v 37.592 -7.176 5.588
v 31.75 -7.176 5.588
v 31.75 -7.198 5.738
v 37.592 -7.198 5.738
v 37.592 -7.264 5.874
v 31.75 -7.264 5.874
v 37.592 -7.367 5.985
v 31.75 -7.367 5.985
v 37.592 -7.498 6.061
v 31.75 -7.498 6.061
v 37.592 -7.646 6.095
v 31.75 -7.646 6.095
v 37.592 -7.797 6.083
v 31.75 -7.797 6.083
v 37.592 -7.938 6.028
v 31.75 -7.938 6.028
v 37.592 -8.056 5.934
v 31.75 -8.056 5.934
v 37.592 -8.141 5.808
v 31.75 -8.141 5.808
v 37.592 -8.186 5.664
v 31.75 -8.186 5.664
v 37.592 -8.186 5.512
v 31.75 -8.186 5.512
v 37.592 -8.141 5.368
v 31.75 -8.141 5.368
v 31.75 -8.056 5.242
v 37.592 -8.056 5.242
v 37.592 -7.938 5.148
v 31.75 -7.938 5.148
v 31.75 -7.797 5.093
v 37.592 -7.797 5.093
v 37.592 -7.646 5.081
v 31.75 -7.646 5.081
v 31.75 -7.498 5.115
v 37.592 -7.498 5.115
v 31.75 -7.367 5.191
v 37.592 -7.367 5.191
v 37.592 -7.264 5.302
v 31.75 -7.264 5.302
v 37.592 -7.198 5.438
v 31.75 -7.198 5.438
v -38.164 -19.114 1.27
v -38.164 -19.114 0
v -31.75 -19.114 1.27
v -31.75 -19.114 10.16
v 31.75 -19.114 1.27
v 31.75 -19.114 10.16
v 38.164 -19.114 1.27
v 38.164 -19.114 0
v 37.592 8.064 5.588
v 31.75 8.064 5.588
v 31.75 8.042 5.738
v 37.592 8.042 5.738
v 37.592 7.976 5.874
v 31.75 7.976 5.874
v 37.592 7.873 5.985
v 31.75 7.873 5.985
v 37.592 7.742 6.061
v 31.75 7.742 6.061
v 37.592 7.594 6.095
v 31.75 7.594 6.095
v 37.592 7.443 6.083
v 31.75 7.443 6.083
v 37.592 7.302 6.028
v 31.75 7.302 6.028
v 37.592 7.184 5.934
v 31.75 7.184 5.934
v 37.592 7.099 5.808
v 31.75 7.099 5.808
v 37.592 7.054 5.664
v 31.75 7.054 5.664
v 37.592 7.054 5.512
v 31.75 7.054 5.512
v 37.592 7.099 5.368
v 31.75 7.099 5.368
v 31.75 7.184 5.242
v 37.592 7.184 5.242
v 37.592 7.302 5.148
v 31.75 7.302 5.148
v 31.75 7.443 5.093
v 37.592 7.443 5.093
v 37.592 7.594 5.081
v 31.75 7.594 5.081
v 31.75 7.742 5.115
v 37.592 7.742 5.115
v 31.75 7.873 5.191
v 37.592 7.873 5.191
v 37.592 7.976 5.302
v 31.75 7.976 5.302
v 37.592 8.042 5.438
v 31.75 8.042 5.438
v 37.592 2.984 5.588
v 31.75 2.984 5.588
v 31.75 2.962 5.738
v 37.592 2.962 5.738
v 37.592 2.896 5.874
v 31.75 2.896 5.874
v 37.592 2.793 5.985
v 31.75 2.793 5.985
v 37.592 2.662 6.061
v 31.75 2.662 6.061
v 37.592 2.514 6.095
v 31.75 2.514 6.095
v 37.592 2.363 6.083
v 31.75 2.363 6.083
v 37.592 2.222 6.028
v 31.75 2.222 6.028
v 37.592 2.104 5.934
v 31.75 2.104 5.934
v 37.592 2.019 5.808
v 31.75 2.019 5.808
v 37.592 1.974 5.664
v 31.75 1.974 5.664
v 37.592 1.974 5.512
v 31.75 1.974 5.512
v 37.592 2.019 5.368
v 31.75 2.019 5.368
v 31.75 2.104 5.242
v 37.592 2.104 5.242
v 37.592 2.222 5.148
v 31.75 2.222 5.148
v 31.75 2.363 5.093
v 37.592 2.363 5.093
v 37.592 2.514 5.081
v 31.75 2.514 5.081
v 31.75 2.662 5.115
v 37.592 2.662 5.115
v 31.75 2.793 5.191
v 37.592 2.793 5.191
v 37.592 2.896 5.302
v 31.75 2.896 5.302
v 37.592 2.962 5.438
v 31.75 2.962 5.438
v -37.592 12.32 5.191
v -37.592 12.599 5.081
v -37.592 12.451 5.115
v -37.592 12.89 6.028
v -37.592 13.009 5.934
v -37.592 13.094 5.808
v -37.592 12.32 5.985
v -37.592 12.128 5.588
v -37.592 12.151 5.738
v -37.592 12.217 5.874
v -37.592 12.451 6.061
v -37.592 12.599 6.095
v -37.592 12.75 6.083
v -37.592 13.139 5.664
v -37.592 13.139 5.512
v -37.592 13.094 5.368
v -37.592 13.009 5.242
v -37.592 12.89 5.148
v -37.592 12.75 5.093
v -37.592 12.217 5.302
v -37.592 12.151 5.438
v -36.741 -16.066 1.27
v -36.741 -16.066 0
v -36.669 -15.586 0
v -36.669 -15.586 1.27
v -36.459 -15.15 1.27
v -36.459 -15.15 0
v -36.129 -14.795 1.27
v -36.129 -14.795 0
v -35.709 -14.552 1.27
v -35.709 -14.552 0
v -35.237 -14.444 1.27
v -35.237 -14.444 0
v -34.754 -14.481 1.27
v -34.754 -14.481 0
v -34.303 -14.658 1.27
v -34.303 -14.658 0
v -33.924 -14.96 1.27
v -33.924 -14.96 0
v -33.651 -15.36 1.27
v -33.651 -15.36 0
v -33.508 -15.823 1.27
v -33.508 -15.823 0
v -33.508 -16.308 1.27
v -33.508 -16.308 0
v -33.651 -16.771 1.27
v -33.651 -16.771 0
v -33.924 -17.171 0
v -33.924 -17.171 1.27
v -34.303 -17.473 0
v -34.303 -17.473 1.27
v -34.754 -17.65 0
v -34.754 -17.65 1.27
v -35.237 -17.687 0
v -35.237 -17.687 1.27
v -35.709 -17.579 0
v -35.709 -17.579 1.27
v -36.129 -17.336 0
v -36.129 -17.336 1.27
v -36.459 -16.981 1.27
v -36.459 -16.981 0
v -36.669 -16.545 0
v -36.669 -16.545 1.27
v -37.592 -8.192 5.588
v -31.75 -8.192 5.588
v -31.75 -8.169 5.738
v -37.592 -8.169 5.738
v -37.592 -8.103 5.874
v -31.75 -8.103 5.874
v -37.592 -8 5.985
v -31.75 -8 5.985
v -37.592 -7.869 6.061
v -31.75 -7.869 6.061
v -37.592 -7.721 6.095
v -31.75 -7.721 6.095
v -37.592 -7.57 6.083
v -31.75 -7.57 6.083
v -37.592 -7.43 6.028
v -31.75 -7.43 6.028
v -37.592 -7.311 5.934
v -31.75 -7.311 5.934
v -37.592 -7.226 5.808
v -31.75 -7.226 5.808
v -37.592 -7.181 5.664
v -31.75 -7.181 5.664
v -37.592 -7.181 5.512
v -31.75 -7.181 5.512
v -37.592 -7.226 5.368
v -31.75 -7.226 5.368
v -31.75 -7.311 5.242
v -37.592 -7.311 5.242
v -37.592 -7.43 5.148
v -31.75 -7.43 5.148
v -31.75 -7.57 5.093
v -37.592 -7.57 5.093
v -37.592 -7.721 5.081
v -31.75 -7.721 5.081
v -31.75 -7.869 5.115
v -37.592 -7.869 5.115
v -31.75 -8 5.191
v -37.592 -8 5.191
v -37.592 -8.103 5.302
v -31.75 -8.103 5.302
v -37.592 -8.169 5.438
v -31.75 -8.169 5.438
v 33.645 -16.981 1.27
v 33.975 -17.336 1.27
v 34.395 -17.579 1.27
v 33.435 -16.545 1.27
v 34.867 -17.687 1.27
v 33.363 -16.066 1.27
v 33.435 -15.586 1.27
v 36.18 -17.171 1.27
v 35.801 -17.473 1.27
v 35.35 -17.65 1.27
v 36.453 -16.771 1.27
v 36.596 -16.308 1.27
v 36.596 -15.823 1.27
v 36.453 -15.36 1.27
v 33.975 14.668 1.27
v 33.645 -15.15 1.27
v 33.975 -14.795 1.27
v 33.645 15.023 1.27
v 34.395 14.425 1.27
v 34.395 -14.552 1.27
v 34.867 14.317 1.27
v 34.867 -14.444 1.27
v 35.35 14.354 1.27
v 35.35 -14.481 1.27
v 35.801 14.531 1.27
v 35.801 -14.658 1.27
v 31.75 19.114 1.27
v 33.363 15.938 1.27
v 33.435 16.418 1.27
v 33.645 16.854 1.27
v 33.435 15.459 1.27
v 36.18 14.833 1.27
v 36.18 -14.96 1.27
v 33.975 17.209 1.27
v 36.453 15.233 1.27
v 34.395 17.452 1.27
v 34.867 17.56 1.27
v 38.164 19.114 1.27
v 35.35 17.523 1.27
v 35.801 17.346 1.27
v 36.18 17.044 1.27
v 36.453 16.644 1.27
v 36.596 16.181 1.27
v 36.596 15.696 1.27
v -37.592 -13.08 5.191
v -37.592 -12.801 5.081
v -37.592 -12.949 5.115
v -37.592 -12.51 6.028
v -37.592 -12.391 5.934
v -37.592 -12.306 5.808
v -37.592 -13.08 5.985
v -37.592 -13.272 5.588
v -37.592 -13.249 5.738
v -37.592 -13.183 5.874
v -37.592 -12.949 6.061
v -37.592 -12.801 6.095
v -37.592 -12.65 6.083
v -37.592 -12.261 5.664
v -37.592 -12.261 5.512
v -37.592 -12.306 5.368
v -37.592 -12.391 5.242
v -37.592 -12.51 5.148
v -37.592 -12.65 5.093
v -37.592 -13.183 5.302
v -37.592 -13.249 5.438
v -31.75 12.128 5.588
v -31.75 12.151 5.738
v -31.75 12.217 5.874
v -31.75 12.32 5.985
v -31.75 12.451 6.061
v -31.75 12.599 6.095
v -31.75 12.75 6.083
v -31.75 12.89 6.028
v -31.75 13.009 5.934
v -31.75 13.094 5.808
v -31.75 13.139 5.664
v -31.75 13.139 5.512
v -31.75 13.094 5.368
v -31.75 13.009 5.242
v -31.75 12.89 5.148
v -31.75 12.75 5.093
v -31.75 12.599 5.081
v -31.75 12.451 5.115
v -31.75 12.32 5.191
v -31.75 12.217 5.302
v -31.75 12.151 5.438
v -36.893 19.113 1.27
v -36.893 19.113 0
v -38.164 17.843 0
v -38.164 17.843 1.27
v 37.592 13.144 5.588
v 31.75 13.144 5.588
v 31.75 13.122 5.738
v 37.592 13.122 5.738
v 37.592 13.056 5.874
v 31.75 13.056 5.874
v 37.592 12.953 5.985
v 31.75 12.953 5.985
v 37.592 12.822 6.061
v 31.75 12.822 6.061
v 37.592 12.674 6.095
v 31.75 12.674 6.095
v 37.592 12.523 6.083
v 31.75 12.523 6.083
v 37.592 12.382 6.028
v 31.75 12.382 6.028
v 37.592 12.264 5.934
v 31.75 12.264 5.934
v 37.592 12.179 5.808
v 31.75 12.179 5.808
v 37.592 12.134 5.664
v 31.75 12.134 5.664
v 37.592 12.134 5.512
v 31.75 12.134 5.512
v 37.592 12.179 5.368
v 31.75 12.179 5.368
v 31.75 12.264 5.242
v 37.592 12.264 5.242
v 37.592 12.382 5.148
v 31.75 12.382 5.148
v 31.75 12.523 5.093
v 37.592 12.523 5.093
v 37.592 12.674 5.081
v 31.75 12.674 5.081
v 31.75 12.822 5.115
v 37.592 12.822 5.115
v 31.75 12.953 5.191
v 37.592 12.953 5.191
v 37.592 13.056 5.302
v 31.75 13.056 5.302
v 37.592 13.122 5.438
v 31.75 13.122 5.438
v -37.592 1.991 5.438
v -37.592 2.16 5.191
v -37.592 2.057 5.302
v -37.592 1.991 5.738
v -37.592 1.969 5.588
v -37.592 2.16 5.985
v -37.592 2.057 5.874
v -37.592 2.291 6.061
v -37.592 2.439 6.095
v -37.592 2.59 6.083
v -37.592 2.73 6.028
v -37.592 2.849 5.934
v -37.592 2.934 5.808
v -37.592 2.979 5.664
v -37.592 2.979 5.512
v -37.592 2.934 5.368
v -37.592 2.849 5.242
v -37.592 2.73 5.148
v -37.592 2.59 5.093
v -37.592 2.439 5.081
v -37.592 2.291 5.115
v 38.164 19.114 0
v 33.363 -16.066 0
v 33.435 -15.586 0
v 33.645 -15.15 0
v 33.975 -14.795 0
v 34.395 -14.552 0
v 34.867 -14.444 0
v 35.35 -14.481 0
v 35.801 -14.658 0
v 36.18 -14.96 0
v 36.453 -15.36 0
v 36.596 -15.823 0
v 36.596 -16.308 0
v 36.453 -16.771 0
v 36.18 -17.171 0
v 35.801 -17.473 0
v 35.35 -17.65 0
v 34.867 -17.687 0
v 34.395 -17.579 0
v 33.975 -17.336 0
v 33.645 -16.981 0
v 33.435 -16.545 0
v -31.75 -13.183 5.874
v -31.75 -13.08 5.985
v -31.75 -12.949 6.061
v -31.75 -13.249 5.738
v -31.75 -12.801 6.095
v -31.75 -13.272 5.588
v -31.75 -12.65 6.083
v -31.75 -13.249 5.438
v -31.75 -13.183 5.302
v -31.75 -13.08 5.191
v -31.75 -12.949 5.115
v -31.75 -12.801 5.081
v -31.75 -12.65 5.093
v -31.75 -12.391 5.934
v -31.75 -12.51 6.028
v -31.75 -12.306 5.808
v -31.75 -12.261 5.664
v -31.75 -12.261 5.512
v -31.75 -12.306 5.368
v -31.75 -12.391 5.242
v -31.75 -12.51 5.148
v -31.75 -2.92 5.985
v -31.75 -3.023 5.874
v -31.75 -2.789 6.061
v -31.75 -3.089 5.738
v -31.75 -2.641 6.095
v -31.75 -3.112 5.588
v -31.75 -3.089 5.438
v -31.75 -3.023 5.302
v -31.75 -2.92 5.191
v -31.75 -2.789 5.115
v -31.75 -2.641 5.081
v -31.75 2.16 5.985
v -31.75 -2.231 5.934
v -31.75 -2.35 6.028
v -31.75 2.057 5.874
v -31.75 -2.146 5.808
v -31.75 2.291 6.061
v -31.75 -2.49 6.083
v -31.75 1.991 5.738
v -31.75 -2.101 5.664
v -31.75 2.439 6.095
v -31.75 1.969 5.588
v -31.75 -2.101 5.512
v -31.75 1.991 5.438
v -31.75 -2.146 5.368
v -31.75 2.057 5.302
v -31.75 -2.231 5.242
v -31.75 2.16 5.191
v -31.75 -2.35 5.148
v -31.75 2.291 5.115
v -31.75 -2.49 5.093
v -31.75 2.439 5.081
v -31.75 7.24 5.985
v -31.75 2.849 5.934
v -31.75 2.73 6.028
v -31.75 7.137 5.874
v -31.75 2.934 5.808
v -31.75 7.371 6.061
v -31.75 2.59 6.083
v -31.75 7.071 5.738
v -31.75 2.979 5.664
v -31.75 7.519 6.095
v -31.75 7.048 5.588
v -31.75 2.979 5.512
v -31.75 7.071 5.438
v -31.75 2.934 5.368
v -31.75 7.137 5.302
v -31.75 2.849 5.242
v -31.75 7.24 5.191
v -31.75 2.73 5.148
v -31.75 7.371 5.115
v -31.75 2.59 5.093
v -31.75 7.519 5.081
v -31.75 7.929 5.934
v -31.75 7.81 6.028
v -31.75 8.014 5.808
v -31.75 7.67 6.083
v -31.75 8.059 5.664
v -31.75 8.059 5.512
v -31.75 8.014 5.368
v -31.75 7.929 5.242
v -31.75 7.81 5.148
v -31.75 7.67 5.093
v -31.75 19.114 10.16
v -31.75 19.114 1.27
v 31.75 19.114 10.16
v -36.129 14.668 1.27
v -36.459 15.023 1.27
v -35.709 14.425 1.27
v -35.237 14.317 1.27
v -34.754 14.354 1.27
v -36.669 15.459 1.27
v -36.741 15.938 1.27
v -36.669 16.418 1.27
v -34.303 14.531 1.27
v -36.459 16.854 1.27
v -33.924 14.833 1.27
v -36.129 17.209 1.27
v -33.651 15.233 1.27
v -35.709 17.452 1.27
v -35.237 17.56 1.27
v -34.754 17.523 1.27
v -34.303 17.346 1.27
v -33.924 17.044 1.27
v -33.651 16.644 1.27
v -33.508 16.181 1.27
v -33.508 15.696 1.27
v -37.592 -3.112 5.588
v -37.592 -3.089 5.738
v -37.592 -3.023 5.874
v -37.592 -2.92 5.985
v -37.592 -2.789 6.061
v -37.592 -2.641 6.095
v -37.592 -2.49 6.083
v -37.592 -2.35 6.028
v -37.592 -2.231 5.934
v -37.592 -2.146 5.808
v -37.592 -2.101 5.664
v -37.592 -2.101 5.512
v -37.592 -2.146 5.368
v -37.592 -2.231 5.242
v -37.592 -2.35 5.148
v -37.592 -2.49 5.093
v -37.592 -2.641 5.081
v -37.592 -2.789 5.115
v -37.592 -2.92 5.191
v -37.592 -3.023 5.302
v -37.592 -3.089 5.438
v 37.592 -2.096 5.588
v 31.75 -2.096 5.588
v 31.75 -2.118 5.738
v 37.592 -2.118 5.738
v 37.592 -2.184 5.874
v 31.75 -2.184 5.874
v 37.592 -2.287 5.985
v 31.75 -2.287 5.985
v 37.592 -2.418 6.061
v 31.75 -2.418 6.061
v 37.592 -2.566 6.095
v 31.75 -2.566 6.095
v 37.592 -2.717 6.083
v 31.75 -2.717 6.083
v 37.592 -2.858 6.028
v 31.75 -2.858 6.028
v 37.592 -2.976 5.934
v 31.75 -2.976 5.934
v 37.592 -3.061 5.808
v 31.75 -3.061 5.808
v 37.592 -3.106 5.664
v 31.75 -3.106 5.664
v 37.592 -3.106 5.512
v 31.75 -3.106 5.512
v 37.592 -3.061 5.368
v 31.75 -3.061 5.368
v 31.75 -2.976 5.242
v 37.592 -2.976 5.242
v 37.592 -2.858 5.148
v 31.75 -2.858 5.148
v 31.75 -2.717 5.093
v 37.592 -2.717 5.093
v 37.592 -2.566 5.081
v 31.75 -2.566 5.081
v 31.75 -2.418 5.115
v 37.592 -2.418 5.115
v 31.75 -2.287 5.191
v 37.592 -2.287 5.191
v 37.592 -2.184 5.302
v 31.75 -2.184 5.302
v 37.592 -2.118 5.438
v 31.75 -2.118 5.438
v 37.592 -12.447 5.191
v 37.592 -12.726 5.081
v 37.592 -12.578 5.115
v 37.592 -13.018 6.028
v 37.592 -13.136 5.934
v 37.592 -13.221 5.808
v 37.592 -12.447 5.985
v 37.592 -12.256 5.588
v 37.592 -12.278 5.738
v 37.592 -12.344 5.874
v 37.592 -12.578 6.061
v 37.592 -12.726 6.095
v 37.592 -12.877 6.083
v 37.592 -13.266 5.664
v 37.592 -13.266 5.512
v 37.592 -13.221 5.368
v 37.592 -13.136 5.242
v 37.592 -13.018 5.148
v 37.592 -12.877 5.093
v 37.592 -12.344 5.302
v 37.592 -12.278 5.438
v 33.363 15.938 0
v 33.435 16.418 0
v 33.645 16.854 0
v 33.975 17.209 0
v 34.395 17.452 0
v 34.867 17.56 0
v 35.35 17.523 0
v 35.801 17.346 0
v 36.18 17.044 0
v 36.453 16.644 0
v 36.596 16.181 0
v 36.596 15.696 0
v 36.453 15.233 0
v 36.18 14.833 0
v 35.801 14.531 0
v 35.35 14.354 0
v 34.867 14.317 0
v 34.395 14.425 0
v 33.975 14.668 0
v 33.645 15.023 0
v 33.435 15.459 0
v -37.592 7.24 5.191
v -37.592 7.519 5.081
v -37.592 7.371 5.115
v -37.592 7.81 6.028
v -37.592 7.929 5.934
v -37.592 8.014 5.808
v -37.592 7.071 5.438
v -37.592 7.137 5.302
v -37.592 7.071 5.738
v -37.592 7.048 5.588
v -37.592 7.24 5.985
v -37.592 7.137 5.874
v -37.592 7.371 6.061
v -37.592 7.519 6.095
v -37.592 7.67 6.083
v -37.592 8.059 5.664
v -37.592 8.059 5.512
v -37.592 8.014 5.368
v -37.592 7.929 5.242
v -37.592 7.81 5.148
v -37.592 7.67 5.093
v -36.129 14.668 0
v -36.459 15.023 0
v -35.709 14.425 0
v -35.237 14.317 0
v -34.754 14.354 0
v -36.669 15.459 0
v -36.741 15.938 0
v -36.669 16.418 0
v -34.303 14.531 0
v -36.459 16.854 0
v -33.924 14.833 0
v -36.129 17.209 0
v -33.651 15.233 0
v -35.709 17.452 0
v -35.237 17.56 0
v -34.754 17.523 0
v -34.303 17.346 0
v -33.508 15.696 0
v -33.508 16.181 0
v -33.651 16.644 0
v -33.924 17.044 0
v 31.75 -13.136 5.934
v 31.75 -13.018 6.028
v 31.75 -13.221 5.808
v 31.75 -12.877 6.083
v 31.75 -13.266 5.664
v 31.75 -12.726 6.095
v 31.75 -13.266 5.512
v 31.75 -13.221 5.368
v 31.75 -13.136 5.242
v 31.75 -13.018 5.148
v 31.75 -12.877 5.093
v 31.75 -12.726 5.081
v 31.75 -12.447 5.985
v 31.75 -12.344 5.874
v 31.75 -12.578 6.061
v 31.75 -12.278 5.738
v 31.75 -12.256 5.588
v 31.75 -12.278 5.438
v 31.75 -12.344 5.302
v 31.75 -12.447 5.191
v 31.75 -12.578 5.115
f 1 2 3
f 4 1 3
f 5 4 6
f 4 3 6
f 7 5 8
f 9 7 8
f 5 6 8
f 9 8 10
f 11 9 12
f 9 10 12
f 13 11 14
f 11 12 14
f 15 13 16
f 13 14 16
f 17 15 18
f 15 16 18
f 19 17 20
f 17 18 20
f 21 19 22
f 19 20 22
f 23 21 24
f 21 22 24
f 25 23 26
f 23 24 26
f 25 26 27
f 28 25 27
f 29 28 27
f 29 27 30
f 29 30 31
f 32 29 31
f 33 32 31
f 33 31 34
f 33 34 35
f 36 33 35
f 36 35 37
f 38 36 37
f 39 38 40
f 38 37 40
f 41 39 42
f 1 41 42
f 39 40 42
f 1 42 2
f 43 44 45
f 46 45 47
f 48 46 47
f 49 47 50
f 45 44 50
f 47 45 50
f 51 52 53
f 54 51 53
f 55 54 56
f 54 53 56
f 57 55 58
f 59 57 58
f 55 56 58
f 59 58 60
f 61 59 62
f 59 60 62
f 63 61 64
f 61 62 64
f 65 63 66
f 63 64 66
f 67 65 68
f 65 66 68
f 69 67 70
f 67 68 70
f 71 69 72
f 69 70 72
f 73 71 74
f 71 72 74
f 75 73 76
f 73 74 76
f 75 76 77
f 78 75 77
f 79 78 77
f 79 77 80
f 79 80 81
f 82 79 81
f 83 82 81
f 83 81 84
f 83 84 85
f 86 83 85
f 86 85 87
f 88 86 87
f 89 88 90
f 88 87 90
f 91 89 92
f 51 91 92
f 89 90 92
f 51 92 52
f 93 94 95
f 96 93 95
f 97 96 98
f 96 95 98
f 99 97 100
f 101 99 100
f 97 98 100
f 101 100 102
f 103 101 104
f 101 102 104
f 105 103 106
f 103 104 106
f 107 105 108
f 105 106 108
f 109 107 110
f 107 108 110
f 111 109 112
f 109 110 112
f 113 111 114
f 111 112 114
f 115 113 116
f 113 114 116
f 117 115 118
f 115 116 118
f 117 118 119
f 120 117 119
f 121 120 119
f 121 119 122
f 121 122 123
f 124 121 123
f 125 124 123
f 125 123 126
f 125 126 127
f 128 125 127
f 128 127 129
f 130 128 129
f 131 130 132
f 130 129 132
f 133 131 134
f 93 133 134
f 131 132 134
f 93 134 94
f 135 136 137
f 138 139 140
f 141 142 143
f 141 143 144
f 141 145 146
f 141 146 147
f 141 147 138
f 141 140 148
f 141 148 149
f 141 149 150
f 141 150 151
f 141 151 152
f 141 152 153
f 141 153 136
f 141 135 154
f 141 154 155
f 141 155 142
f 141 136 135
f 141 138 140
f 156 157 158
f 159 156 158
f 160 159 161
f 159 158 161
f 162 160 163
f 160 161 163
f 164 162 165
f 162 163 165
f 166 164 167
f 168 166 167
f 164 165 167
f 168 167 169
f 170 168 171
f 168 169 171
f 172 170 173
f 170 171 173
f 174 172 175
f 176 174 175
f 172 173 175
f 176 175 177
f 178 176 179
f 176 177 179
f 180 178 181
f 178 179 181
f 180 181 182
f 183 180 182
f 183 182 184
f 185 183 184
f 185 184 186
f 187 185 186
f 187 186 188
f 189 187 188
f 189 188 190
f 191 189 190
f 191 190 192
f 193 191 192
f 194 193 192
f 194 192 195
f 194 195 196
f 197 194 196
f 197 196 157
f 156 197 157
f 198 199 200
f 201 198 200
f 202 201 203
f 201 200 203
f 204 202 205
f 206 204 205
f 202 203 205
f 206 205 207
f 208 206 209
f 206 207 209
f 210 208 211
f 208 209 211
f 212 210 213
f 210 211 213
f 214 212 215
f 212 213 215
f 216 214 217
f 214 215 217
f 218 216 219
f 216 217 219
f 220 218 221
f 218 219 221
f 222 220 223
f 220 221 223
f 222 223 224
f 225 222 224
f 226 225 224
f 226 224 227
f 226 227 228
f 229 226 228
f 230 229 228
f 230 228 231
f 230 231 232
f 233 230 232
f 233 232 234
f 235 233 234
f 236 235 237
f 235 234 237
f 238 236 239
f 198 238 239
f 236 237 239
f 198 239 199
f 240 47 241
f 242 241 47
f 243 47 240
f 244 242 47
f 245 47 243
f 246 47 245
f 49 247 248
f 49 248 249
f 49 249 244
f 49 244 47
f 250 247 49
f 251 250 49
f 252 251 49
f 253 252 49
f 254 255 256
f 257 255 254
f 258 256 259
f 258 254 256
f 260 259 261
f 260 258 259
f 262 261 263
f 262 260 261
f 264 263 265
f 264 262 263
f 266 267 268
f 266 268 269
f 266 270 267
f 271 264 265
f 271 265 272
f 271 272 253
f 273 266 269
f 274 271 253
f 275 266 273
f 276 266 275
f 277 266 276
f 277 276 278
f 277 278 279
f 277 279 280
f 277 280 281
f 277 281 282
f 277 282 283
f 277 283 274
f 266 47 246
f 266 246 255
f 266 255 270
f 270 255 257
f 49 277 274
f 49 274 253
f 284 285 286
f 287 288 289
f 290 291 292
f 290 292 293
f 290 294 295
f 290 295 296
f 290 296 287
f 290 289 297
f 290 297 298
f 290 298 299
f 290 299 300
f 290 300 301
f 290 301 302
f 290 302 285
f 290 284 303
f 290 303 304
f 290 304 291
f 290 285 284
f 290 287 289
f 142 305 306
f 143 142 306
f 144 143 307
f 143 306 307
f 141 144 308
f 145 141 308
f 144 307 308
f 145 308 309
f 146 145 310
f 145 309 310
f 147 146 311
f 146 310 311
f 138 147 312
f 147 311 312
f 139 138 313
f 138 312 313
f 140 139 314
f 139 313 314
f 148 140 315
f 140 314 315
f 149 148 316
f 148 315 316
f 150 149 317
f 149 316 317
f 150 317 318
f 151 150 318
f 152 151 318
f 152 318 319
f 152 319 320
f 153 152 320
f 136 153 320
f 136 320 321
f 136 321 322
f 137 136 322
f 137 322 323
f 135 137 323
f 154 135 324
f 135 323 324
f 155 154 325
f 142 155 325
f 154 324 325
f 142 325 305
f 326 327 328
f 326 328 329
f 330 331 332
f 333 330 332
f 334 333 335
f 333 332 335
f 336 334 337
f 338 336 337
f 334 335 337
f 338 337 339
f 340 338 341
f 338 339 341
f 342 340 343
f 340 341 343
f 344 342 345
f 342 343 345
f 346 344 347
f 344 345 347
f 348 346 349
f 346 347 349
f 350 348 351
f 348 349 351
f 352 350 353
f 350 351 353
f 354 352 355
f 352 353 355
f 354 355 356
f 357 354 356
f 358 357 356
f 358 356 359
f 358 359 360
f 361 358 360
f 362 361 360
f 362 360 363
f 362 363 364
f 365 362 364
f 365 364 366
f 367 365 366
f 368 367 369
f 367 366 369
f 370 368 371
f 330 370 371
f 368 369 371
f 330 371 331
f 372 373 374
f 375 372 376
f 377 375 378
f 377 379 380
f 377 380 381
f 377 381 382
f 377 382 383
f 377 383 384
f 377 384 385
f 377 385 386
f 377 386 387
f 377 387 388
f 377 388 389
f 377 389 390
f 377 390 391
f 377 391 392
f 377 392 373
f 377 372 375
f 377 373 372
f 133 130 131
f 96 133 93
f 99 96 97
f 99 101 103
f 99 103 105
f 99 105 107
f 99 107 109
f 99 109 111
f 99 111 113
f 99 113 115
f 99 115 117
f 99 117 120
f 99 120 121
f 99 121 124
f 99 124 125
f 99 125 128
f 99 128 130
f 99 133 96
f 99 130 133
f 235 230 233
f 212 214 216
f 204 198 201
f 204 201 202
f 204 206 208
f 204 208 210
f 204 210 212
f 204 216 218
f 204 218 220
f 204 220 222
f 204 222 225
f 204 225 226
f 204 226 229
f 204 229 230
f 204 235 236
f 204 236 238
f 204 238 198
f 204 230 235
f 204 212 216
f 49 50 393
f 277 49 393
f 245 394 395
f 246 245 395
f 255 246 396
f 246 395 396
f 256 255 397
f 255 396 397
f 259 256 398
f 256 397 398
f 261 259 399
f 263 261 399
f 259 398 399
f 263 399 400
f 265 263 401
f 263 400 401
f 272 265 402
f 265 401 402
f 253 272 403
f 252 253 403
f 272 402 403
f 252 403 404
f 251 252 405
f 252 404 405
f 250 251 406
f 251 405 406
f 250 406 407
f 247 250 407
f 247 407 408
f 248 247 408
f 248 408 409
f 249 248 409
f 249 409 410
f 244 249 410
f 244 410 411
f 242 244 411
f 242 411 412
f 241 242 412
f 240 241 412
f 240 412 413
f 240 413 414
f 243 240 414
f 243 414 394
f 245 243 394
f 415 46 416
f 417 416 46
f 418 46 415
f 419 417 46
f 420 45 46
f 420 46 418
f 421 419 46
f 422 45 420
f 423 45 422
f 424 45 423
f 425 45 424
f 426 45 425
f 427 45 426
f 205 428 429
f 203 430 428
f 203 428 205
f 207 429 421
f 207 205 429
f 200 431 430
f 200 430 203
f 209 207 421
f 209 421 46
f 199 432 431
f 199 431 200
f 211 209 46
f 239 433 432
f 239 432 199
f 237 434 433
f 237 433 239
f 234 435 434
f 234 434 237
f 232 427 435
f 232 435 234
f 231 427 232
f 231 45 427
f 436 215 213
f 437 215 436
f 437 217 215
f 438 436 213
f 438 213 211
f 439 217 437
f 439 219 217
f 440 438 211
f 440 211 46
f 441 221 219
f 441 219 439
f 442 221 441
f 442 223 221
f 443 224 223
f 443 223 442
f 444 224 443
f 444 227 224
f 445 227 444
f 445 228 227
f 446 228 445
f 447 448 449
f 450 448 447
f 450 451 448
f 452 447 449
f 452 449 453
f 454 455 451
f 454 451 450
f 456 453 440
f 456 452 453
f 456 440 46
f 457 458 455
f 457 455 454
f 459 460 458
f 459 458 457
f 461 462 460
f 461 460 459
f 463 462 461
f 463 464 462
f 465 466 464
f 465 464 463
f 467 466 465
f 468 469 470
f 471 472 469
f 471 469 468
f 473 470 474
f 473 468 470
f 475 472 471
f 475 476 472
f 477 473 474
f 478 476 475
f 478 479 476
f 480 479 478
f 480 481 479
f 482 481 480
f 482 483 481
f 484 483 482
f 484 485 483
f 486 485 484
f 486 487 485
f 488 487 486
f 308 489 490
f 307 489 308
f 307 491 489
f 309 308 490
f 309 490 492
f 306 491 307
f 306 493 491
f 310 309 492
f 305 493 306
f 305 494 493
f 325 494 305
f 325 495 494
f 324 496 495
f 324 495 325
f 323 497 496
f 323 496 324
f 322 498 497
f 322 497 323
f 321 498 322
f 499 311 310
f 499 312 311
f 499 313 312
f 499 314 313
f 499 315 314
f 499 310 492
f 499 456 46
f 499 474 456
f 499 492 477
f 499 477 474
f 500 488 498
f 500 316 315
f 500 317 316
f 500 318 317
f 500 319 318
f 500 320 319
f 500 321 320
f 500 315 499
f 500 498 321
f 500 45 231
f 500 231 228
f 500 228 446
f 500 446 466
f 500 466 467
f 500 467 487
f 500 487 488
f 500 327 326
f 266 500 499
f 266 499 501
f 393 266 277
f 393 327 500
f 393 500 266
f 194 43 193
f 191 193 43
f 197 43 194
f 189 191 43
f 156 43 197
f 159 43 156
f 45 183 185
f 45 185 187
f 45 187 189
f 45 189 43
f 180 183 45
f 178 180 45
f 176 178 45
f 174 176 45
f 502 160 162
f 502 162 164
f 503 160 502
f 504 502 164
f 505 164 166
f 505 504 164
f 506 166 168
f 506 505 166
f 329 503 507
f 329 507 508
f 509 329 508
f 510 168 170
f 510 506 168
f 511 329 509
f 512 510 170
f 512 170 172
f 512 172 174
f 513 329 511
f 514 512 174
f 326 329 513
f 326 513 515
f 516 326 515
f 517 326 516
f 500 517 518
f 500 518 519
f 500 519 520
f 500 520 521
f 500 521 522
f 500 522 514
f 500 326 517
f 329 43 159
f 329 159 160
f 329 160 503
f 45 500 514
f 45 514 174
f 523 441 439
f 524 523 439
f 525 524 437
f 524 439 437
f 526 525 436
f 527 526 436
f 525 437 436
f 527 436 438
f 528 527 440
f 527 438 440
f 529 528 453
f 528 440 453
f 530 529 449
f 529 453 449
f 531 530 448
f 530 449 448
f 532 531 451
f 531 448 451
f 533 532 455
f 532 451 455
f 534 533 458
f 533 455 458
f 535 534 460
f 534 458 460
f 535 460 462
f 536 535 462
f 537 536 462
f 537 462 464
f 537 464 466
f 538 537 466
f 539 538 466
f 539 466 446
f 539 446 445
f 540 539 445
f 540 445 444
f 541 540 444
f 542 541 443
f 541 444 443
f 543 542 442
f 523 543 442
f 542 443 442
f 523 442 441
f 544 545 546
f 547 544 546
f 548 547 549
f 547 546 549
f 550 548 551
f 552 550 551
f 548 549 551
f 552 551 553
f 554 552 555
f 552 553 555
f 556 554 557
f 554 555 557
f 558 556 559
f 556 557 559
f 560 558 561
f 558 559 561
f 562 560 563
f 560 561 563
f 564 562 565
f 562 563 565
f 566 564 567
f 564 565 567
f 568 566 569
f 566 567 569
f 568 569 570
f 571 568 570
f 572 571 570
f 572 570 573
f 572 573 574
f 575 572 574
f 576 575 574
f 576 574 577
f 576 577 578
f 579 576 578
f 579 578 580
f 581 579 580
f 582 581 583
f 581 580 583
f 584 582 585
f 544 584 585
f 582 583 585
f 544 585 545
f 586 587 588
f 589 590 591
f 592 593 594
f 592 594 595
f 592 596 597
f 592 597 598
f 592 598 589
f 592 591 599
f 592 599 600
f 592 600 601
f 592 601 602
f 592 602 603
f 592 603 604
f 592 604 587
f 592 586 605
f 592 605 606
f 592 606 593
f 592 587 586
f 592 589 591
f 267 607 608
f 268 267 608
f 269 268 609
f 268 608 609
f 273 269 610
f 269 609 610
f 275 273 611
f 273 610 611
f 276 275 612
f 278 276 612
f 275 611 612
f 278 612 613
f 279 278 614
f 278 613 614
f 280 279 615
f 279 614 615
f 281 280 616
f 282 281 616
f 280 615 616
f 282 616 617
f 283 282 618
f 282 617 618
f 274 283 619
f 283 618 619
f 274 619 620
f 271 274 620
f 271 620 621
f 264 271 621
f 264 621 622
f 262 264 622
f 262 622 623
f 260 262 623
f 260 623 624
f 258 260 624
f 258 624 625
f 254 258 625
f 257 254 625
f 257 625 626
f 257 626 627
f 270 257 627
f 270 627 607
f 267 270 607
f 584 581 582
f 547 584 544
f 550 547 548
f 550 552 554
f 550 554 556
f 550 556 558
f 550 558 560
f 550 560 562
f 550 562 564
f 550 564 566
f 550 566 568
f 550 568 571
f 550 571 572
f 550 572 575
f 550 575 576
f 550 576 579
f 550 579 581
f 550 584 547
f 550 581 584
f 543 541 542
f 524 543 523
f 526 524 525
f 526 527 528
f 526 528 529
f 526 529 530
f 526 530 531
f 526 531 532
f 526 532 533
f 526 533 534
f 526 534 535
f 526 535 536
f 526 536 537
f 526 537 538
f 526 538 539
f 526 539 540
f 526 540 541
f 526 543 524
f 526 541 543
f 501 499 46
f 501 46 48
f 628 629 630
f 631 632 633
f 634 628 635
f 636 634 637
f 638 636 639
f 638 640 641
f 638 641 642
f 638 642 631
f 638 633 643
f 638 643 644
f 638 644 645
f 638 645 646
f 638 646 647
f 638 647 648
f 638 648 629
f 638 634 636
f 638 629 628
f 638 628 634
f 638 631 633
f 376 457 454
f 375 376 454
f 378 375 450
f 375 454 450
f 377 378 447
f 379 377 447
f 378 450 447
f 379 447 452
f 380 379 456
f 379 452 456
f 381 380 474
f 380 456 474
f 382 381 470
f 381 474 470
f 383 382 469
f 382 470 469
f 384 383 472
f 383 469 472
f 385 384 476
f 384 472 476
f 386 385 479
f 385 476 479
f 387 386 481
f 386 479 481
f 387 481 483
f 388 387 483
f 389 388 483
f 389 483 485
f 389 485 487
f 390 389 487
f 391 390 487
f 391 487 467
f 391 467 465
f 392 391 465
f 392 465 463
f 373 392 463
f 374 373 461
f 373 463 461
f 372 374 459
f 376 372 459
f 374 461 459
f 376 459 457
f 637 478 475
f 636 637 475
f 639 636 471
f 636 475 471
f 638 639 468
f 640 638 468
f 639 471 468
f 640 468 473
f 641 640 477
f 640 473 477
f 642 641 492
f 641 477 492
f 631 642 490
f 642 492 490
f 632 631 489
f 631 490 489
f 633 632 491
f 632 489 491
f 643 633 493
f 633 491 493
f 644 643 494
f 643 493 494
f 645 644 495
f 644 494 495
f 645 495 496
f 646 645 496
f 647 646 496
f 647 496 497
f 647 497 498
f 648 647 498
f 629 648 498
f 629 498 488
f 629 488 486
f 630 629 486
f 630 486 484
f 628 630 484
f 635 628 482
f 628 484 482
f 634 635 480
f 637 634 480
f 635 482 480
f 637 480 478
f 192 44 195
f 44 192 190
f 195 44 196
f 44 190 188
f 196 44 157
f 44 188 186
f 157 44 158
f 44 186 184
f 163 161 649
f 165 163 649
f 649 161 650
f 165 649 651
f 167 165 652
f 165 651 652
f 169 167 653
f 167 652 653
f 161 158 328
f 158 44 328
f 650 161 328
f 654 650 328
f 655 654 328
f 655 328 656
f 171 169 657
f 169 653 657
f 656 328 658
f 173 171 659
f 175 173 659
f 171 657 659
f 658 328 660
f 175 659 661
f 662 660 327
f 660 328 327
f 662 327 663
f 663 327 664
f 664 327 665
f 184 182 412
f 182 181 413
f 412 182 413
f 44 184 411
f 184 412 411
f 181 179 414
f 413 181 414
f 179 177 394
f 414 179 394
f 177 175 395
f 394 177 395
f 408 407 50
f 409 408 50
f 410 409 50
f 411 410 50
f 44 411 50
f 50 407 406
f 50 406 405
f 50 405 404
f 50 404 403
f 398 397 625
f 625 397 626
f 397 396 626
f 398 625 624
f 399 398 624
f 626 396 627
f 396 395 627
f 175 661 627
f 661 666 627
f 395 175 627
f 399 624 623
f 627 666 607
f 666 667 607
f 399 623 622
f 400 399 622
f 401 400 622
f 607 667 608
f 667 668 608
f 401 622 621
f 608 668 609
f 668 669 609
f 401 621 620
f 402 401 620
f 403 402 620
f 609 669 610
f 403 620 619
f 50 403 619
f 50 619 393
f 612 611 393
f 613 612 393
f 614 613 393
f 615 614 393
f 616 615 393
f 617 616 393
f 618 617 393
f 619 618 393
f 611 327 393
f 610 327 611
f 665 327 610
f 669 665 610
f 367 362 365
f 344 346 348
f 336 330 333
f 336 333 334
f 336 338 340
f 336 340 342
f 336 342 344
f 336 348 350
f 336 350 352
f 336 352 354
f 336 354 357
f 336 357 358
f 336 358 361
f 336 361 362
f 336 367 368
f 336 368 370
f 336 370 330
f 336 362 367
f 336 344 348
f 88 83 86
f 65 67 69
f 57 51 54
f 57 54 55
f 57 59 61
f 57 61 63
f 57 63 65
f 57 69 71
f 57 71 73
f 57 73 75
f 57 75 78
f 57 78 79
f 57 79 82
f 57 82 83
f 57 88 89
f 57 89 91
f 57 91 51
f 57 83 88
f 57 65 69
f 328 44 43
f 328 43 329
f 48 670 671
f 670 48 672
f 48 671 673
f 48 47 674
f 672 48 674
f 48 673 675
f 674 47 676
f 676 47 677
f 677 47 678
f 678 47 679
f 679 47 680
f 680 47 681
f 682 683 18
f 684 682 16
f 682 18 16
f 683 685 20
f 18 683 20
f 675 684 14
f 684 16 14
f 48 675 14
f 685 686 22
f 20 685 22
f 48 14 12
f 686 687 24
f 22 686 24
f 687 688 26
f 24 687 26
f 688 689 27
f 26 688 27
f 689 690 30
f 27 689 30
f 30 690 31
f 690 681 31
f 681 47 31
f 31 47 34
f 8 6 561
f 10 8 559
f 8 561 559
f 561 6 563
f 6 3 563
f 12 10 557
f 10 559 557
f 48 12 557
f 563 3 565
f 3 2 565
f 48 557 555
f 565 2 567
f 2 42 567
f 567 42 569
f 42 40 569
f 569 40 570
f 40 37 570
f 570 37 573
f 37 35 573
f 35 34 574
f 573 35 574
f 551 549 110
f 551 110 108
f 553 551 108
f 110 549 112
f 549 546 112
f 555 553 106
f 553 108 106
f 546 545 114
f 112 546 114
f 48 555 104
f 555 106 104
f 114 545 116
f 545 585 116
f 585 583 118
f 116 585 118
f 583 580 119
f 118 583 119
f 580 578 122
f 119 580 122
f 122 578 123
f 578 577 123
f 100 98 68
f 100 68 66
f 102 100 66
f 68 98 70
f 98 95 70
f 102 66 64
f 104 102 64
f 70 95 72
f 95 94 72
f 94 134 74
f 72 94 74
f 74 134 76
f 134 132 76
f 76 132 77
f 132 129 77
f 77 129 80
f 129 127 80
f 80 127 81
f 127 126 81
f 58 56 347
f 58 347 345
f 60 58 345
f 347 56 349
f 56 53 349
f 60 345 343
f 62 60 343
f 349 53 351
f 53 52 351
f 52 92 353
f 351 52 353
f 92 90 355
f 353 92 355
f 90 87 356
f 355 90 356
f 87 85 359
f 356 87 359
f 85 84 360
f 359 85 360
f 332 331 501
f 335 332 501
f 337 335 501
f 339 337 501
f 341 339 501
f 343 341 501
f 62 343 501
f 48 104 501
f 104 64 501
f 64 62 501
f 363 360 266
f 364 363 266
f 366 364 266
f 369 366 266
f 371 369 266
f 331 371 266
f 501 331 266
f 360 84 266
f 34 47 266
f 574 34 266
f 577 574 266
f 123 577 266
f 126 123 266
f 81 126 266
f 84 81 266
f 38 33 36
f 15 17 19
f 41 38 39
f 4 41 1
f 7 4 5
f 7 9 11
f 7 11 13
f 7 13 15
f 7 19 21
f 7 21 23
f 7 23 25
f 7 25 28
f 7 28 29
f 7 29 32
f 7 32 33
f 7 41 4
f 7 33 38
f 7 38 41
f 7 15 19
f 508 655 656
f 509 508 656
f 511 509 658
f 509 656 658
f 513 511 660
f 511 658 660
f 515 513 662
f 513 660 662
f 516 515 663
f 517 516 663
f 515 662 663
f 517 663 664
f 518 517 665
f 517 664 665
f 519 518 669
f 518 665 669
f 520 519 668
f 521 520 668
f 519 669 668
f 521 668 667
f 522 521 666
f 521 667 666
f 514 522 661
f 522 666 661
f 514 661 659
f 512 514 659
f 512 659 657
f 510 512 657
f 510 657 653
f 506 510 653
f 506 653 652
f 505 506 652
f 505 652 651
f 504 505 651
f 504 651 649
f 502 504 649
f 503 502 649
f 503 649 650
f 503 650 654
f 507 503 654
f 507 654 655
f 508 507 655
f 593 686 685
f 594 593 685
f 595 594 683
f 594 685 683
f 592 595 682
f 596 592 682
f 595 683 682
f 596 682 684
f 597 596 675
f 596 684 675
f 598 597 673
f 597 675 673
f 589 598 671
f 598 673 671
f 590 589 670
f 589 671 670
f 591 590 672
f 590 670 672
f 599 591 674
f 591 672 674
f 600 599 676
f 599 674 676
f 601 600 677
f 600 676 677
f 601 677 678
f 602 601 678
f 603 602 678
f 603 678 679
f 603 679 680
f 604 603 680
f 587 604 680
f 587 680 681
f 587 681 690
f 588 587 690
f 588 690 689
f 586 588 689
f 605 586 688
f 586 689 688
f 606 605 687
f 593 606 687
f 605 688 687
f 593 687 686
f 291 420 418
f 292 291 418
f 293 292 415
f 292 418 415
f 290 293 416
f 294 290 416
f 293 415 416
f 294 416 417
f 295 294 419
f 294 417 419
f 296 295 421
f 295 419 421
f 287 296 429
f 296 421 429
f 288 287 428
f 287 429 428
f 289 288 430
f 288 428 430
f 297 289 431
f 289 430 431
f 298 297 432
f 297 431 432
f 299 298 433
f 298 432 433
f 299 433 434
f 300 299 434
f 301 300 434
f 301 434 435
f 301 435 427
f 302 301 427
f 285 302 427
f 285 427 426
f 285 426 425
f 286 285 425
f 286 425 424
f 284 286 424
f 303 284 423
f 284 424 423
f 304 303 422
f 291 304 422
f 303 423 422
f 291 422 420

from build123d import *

# Parameters (mm, degrees)
F0_W      = 76.327
F0_H      = 38.227
F1_DEPTH  = 1.27
F2_W      = 63.5
F2_H      = 38.227
F3_DEPTH  = 8.89
F5_D      = 3.2512
F6_D      = 3.2512
F8_D      = 3.2512
F9_D      = 3.2512
F10_R     = 0.508
F12_DEPTH = 5.842
F11_R     = 0.508
F13_DEPTH = 5.842
F14_SIZE  = 1.27


with BuildPart() as f1:
    # F0 (on Top) → F1 (new body)
    with BuildSketch(Plane.XY):
        Rectangle(F0_W, F0_H)
    extrude(amount=F1_DEPTH)

    # F2 (on face) → F3 (join)
    with BuildSketch(Plane.XY.offset(1.27)):
        Rectangle(F2_W, F2_H)
    extrude(amount=F3_DEPTH)

    # F5 (through all)
    with Locations(Plane.XY.offset(1.27)):
        with Locations((34.9885, -16.0655)):
            Hole(F5_D / 2)

    # F6 (through all)
    with Locations(Plane.XY.offset(1.27)):
        with Locations((34.9885, 15.9385)):
            Hole(F6_D / 2)

    # F8 (through all)
    with Locations(Plane.XY.offset(1.27)):
        with Locations((-35.1155, -16.0655)):
            Hole(F8_D / 2)

    # F9 (through all)
    with Locations(Plane.XY.offset(1.27)):
        with Locations((-35.1155, 15.9385)):
            Hole(F9_D / 2)

    # F10 (on face) → F12 (join)
    with BuildSketch(Plane.YZ.offset(31.75)):
        with Locations((-12.7635, 5.588)):
            Circle(F10_R)
        with Locations((-7.6835, 5.588)):
            Circle(F10_R)
        with Locations((-2.6035, 5.588)):
            Circle(F10_R)
        with Locations((2.4765, 5.588)):
            Circle(F10_R)
        with Locations((7.5565, 5.588)):
            Circle(F10_R)
        with Locations((12.6365, 5.588)):
            Circle(F10_R)
    extrude(amount=F12_DEPTH)

    # F11 (on face) → F13 (join)
    with BuildSketch(Plane(origin=(-31.75, 0, 0), x_dir=(0, -1, 0), z_dir=(-1, 0, 0))):
        with Locations((-12.6365, 5.588)):
            Circle(F11_R)
        with Locations((-7.5565, 5.588)):
            Circle(F11_R)
        with Locations((-2.4765, 5.588)):
            Circle(F11_R)
        with Locations((2.6035, 5.588)):
            Circle(F11_R)
        with Locations((7.6835, 5.588)):
            Circle(F11_R)
        with Locations((12.7635, 5.588)):
            Circle(F11_R)
    extrude(amount=F13_DEPTH)

    # F14
    f14_edges = [f1.edges().sort_by_distance(p)[0] for p in [
        (-38.1635, 19.1135, 0.635),
    ]]
    chamfer(f14_edges, length=F14_SIZE)


solid = f1.part
